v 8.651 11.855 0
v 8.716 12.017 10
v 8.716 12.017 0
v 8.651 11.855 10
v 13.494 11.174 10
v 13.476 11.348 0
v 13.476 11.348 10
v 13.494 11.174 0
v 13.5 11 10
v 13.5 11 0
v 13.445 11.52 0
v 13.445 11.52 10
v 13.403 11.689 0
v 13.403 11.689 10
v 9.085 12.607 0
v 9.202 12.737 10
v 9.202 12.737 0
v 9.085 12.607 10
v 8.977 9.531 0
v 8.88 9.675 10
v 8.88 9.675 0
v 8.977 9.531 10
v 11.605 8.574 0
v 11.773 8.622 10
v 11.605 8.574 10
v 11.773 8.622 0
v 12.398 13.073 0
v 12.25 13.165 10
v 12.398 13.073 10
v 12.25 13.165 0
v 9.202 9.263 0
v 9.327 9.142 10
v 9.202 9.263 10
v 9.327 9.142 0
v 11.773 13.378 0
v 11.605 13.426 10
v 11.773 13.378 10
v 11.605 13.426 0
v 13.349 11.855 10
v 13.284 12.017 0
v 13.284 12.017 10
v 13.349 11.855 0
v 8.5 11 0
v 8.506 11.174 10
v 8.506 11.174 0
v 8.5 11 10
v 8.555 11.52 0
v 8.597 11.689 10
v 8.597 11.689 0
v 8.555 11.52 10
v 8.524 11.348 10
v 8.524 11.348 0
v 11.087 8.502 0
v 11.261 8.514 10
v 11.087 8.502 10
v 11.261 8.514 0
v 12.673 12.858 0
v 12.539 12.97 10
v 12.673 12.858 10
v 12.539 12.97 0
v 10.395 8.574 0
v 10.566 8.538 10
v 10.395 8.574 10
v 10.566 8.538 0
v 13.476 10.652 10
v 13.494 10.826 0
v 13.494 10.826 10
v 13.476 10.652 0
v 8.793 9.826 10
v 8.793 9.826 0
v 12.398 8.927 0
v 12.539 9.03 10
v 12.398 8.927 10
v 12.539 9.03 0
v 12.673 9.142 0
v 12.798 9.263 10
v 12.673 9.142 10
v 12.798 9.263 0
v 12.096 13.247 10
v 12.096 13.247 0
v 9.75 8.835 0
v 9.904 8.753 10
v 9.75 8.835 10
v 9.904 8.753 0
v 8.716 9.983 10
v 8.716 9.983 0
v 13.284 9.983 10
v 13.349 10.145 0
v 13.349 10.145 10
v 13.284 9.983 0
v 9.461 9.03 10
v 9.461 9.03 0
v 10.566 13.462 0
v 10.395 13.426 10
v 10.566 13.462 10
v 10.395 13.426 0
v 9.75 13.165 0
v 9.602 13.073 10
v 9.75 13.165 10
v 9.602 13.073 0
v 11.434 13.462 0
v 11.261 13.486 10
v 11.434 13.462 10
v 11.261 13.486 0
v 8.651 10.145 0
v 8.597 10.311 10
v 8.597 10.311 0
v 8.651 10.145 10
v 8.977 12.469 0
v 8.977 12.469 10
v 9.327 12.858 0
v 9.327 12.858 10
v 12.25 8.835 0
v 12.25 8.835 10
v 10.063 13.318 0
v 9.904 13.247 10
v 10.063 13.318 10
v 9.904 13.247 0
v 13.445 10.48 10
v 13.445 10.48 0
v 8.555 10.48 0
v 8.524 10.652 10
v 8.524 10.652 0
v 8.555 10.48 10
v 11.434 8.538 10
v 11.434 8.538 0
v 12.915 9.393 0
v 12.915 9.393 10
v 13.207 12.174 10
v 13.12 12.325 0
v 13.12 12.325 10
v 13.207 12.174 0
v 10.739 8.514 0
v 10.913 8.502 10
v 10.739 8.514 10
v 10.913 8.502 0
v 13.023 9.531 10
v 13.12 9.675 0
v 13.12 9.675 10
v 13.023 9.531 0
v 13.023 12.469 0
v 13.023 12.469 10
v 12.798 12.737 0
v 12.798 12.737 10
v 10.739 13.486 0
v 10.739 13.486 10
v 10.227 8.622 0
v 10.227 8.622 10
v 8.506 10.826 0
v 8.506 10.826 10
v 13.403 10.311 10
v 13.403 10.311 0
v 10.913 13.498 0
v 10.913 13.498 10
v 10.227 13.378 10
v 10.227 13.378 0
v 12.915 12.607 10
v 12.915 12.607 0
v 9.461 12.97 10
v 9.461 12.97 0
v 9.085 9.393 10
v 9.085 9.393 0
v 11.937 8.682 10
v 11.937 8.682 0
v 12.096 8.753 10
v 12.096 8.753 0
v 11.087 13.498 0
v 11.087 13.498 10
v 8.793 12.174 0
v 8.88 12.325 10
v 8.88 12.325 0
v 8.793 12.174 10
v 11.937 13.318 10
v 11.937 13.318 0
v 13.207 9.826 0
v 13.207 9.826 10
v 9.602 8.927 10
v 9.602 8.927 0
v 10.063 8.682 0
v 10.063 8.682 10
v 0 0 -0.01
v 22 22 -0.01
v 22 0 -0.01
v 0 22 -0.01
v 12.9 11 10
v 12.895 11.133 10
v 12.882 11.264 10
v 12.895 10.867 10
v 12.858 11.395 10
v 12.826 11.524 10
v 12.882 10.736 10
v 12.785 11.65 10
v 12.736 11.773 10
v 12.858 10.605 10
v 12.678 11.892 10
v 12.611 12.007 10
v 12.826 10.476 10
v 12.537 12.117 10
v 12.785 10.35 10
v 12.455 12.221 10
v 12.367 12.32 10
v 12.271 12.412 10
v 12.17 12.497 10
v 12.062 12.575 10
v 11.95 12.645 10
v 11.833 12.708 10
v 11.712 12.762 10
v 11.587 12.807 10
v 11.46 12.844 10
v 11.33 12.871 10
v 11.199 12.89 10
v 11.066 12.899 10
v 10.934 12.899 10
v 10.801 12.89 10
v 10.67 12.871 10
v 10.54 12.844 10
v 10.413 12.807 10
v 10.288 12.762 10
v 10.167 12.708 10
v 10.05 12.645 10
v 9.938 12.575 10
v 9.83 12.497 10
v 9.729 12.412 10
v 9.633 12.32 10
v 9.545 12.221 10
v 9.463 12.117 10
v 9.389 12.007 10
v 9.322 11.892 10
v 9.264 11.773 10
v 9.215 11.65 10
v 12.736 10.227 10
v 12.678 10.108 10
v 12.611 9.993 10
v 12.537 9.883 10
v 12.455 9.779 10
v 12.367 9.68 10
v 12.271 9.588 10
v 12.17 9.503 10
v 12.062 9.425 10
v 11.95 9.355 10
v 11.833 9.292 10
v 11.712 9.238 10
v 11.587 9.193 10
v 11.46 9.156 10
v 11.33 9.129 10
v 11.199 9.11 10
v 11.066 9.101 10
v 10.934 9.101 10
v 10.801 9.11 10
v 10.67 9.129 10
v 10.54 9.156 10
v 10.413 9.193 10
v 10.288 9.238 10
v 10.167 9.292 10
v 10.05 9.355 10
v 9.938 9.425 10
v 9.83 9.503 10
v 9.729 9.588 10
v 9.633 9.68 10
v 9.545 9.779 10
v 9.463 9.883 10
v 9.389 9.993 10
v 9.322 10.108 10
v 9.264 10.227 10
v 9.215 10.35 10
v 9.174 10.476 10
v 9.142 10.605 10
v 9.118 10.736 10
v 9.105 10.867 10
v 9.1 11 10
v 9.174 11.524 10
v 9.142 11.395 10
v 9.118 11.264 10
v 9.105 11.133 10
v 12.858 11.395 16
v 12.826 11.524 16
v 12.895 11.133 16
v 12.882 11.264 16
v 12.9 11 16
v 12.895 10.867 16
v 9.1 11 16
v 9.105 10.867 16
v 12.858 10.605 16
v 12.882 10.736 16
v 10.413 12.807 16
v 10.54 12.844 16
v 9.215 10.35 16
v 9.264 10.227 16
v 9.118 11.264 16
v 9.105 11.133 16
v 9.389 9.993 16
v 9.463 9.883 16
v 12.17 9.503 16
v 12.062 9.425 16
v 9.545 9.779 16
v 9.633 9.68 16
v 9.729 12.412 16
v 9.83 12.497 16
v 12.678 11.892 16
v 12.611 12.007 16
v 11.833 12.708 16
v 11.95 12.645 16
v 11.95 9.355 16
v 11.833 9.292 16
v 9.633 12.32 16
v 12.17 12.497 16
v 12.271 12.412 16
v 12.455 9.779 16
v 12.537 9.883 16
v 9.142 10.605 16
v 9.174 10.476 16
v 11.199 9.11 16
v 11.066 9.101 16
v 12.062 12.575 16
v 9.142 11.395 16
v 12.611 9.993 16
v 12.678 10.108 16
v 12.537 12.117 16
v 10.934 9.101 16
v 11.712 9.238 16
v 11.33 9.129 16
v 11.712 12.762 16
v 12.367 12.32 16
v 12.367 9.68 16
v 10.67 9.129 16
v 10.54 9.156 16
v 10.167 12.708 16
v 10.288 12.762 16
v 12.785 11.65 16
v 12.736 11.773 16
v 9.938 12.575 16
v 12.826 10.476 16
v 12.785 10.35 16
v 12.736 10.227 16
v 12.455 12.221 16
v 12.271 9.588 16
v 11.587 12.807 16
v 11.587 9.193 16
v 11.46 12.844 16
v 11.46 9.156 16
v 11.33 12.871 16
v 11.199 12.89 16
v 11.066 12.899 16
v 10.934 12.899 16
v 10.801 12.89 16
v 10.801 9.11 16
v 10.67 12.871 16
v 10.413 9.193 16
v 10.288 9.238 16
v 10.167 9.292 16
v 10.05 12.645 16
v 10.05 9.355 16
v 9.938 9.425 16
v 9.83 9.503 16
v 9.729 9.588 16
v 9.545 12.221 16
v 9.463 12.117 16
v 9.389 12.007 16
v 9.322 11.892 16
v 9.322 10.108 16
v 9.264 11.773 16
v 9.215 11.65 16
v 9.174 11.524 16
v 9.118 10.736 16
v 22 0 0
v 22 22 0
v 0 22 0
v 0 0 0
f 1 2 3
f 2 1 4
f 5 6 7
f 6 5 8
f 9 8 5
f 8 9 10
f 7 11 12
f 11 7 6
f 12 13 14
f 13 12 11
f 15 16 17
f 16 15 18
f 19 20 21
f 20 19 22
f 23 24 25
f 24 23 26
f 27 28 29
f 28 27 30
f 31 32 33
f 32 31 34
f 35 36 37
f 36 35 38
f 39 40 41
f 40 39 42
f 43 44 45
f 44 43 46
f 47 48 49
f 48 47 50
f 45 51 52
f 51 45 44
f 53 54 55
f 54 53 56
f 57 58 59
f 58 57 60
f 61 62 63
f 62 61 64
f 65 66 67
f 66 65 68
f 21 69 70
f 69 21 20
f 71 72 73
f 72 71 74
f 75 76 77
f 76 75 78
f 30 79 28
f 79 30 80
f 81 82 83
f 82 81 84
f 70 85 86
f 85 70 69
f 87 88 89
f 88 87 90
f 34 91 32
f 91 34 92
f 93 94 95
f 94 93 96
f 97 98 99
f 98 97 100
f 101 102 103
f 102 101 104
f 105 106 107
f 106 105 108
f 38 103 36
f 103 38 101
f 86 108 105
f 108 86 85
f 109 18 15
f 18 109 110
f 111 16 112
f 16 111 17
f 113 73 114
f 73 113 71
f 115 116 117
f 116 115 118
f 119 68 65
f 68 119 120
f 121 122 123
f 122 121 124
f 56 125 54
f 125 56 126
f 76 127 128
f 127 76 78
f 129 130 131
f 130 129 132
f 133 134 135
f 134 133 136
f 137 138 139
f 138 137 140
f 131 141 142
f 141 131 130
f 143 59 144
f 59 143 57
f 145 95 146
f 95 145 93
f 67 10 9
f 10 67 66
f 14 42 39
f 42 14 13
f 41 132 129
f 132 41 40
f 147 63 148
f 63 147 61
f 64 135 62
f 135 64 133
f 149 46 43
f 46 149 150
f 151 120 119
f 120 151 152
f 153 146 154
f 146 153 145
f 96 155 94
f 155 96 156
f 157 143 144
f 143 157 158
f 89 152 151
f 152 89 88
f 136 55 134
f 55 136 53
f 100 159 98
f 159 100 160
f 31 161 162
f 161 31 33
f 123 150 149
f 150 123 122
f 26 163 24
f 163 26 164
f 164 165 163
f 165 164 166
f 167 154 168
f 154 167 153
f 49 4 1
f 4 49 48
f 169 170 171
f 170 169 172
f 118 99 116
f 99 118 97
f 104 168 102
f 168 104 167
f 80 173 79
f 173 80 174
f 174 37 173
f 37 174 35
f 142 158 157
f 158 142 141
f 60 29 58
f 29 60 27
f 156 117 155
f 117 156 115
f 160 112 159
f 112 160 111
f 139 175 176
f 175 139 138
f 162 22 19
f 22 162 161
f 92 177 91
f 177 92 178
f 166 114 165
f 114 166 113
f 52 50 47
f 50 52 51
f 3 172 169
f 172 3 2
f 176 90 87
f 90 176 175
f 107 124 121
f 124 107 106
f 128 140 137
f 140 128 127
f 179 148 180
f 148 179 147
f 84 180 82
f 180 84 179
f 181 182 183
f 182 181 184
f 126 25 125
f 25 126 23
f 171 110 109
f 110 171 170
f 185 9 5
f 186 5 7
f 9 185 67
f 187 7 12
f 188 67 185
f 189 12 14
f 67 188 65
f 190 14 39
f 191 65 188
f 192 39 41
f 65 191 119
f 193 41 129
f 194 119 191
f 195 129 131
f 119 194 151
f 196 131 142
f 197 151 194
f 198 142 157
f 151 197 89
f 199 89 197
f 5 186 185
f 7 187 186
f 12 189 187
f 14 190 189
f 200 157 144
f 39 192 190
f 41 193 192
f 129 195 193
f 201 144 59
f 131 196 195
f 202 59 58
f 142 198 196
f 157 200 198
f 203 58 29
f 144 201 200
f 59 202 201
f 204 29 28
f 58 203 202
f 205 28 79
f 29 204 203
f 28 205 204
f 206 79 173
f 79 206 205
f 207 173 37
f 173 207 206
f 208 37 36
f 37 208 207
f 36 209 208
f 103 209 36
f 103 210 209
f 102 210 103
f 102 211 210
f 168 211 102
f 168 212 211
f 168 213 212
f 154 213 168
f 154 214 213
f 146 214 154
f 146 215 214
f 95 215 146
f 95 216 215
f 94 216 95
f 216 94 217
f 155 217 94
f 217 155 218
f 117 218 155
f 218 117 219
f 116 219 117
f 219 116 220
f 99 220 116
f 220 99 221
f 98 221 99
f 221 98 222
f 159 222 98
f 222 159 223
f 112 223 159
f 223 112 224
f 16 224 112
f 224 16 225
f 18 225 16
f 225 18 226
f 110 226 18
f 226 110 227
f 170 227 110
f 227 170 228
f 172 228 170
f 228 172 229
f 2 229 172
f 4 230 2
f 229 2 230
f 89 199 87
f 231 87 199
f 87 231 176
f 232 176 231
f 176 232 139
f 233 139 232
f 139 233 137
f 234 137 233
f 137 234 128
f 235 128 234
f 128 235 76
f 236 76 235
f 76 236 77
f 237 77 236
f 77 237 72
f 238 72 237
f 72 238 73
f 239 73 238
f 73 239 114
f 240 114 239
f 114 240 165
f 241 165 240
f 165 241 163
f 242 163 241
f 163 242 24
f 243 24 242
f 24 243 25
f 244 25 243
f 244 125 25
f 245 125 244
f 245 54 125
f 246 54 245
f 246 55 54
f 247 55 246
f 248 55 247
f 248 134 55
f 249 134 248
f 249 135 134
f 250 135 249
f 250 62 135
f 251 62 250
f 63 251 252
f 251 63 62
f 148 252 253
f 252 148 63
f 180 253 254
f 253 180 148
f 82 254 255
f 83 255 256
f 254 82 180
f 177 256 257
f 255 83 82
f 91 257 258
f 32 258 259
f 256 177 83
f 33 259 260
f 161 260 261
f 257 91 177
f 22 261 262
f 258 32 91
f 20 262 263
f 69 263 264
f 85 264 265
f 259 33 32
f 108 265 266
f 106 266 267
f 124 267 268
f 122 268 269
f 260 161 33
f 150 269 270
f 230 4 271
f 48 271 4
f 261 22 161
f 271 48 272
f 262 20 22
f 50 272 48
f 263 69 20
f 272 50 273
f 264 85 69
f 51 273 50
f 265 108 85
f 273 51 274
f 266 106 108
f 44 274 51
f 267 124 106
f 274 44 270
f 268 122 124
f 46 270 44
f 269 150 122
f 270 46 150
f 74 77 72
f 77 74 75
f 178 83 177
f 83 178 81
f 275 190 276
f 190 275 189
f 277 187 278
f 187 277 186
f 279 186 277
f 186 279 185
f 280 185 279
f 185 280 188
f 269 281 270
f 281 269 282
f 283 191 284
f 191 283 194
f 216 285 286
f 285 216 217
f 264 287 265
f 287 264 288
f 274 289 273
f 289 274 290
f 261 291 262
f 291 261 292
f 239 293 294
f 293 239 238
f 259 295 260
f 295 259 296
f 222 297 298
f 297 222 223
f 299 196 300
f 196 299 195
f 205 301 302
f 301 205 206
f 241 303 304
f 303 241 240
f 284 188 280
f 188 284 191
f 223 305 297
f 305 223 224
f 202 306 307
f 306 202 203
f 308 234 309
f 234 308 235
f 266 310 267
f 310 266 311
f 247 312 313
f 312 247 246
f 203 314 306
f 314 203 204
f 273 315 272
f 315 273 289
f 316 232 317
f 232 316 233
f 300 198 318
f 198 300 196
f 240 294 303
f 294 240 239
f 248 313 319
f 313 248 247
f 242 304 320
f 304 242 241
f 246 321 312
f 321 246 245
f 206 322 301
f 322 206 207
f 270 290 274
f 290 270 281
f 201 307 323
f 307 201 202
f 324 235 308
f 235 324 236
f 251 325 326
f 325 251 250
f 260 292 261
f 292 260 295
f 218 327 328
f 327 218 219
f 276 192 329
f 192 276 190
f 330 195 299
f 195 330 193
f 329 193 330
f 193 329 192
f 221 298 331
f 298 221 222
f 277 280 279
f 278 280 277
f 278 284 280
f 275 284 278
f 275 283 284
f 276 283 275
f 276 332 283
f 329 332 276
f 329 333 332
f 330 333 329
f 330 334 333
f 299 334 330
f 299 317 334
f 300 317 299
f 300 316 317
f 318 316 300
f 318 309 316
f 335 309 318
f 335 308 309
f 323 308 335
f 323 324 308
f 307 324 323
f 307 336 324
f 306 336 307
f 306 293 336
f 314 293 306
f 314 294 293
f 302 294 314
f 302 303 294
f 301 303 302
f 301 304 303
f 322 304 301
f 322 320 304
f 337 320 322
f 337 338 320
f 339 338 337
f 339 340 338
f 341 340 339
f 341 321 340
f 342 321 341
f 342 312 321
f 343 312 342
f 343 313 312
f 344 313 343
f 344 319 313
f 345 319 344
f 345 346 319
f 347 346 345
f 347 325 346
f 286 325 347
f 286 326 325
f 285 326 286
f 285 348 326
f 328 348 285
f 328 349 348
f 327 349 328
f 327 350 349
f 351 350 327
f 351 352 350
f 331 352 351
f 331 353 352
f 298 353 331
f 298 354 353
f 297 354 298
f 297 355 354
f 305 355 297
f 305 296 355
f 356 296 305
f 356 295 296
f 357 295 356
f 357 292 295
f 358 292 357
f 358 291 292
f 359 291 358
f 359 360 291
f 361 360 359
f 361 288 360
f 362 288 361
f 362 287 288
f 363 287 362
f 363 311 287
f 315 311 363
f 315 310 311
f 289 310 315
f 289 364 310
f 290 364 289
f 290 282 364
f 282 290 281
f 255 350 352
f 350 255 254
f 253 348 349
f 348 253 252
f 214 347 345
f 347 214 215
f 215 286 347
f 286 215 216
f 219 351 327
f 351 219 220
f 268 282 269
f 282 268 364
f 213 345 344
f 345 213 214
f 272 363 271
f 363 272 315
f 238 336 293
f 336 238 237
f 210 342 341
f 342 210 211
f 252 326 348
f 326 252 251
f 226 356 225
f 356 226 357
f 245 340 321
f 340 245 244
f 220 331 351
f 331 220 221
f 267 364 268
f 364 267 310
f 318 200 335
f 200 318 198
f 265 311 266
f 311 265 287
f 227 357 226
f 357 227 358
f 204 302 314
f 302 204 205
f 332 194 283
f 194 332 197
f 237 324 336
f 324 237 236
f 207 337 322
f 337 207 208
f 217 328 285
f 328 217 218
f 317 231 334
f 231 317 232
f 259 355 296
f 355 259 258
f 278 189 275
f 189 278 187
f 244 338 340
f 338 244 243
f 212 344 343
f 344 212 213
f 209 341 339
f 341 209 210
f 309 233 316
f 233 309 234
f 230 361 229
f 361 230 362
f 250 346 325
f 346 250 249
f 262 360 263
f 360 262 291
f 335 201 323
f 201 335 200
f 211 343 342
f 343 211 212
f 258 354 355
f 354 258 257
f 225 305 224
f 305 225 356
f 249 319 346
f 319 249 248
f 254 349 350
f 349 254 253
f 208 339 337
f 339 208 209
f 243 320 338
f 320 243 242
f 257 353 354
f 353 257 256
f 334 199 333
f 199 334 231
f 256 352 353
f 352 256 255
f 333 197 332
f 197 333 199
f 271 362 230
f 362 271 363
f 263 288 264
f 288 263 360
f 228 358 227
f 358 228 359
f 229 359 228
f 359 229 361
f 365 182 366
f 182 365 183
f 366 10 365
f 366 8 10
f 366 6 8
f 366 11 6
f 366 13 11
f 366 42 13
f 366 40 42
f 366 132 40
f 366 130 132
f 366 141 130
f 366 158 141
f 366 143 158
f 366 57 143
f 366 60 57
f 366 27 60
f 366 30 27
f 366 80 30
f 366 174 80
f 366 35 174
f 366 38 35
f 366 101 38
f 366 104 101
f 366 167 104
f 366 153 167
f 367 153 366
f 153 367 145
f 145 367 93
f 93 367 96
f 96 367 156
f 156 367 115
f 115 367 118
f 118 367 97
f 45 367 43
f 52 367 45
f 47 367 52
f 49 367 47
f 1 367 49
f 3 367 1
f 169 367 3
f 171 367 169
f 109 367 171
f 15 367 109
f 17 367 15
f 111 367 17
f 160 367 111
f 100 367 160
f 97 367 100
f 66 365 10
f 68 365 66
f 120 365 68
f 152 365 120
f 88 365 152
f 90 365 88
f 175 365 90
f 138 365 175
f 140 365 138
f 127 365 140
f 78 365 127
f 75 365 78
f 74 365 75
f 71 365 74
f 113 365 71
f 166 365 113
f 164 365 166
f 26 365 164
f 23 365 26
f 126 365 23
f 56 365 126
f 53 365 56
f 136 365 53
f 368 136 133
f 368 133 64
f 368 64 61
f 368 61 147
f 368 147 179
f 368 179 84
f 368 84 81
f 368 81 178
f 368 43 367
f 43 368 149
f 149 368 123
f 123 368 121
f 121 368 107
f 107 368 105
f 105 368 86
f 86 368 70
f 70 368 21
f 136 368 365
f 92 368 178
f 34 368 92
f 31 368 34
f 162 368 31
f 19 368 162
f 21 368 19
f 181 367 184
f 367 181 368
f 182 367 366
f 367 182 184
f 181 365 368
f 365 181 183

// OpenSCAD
// file: ../Base/Rotation.scad
// Fischertechnik Box Foundation
// Geometry Helpers Rotation

include <PlacementOptions.scad>

// getRotatedSpace(space, rotation=NoRotation)
// Rotates the space dependent on the specified rotation

function getRotatedSpace(space, rotation=NoRotation) = [
    (rotation == Rotate90 || rotation == Rotate270) ? space.y : space.x,
    (rotation == Rotate90 || rotation == Rotate270) ? space.x : space.y
];

// Rotates the given space around the fixed left lower corner
// space = the space the children needs as width/depth list [width,depth]
// rotation = 0 Rotate0 degrees, 1 Rotate90 degrees, 2 Rotate180 degrees, 3 Rotate270 degrees (equivalent to -90)

module RotateFix(space, rotation=NoRotation) {
    dy = (rotation == Rotate0 || rotation == Rotate270) ? 0 :
        (rotation == Rotate90) ? space.x :
        space.y;
    dx = (rotation < Rotate180) ? 0 :
        (rotation == Rotate180) ? space.x :
        space.y;
    
    translate([dx, dy, 0])
        rotate([0, 0, rotations[rotation]])
            children();
}
// file: ../Base/Alignment.scad
// Fischertechnik Box Foundation
// Geometry Helpers Alignment

include <PlacementOptions.scad>

// getAlignedX(elementWidth, spaceWidth, align=AlignRight, offset=0)
// Gets the aligned X offset of an element with the given
// width in the given space.
// elementWidth = The width of the element to positon
// spaceWidth = The space where the element should be aligned
// align = 0 AlignLeft, 1 AlignCenter, 2 AlignRight
// offset = an optional offset from the aligned position. When
// aligned left or centered, then positive values are in X direction.
// When aligned right then positive values are in negative X direction.

function getAlignedX(elementWidth, spaceWidth, align=AlignRight, offset=0) =
    (align == AlignLeft) ?
        offset :
        ((align == AlignCenter) ?
        (spaceWidth - elementWidth)/2 + offset :
        spaceWidth - offset - elementWidth);

// getAlignedY(elementDepth, spaceDepth, align=AlignTop, offset=0)
// Gets the aligned Y offset of an element with the given
// depth in the given space.
// elementDepth = The depth of the element to positon
// spaceDepth = The space where the element should be aligned
// align = 0 AlignBottom, 1 AlignCenter, 2 AlignTop
// offset = an optional offset from the aligned position. When
// aligned bottom or centered, then positive values are in Y direction.
// When aligned top then positive values are in negative Y direction.

function getAlignedY(elementDepth, spaceDepth, align=AlignTop, offset=0) =
    (align == AlignBottom) ?
        offset :
        ((align == AlignCenter) ?
        (spaceDepth - elementDepth)/2 + offset :
        spaceDepth - offset - elementDepth);
// file: ../Base/PlacementOptions.scad
// Fischertechnik Box Foundation
// Placement Options

// Alignment
NoAlign = 0;
AlignLeft = 1;
AlignBottom = 2;
AlignCenter = 3;
AlignRight = 4;
AlignTop = 5;

// Element rotation degree steps
rotations = [0, -90, -180, -270];

// Rotation
NoRotation = 0;
Rotate0 = 0;
Rotate90 = 1;
Rotate180 = 2;
Rotate270 = 3;

// Docking (seen from above)
NoDock = -1;
DockLeft = 0;
DockTop = 1;
DockRight = 2;
DockCorner = 2;
DockBottom = 3;

// Web corners
LowerLeft = 0;
UpperLeft = 1;
UpperRight = 2;
LowerRight = 3;

// Web position relative to corner
LeftOfCorner = 0;
RightOfCorner = 1;
// file: ../Base/Boxes.scad
// Fischertechnik Box Foundation
// Pre-designed Boxes

use <Constants.scad>

include <PlacementOptions.scad>

box190Width = 190;
box190Depth = 130;
box130Width = 130;
box130Depth = 95;

// Values are from an original ec3 box
topBottomDifference = 1.5;
outerHeight = 40;
innerHeight = 38.2;
baseThickness = outerHeight - innerHeight;
stackExcess = 5.7;
radius = 3.5;
wallThickness = 1.5;
tolerance = 0.2;
stackOffset = innerHeight - stackExcess;

boxUsageHeight = stackOffset;
boxWallThickness = wallThickness;
boxBaseThickness = baseThickness;
boxWebWidth = 3.0;

// getBoxWallThickness()
// Gets the wall thickness of a Fischertechnik Box
function getBoxWallThickness() = boxWallThickness;

// getBoxUsageHeight()
// Gets the usable height of a Fischertechnik box
function getBoxUsageHeight() = boxUsageHeight;

// getBoxInnerHeight()
// Gets the inner height of a Fischertechnik box, including the stack excess
function getBoxInnerHeight() = innerHeight;

// getBoxBaseThickness()
// Gets the thickness of the Fischertechnik box base.
function getBoxBaseThickness() = boxBaseThickness;

// getBoxWebWidth()
// Gets the width of a box web
function getBoxWebWidth() = boxWebWidth;

// getBox190Space()
// Gets the usable inner space of a Box 190 as an x/y-list
function getBox190Space() = [
    box190Width - 2*getBoxWallThickness() - topBottomDifference, 
    box190Depth - 2*getBoxWallThickness() - topBottomDifference ];

// BoxBase(width, depth)
// Creates an empty stackable Fischertechnik compatible box
// width = Outer width of the box (190, 130, ...)
// depth = Outer depth of the box (130, 95, ...)

module BoxBase(width, depth, height=outerHeight) {    
    thinPlate = 0.01;

    innerHeight = height - baseThickness;    
    
    module BodyPlate(width, depth) {
        translate([radius, radius])
        hull() {
            w = width-2*radius;
            d = depth-2*radius;
            cube([w, d, thinPlate]);
            cylinder(thinPlate, r=radius, $fn=getFragments());
            translate([w, 0])
                cylinder(thinPlate, r=radius, $fn=getFragments());
            translate([w, d])
                cylinder(thinPlate, r=radius, $fn=getFragments());
            translate([0, d])
                cylinder(thinPlate, r=radius, $fn=getFragments());
        }
    }
    
    module Body(tolerance=tolerance) {
        hull() {
            // Bottom with tolerance to fit into the original boxes when stacked
            translate([-wallThickness+tolerance, -wallThickness+tolerance, -baseThickness])
                BodyPlate(width-topBottomDifference-2*tolerance, depth-topBottomDifference-2*tolerance);
            
            // Top
            translate([-wallThickness-topBottomDifference/2, -wallThickness-topBottomDifference/2, innerHeight-thinPlate])
                BodyPlate(width, depth);
         }
    }

    module Cutoff() {
        hull() {
            coWidth = width - 2*wallThickness;
            coDepth = depth - 2*wallThickness;
            
            // Bottom
            BodyPlate(coWidth-topBottomDifference, coDepth-topBottomDifference);

            // Top
            translate([-topBottomDifference/2, -topBottomDifference/2, innerHeight+thinPlate]) 
                BodyPlate(coWidth, coDepth);
        }
    }
    
    difference() {        
        Body();
        Cutoff();
        stackOffset = innerHeight - stackExcess;
        translate([0, 0, stackOffset + baseThickness])
            Body(tolerance=0);
    }
}

// Creates the Fischertechnik empty box 130x190 mm and places it at position 0,0
// 190x130 are the outer sizes, the inner space is slightly smaller. Use getBox190Space() to get the inner sizes.
// The box is positioned that the usable inner space is at the 0,0,0 position. The

module Box190() {
    BoxBase(box190Width, box190Depth);
}

// Gets the usable inner space of a Box 130 as an x/y-list
function getBox130Space() = [
    box130Width - 2*getBoxWallThickness() - topBottomDifference, 
    box130Depth - 2*getBoxWallThickness() - topBottomDifference ];

// Creates the Fischertechnik empty box 95x130 mm and places it at position 0,0
// 190x130 are the outer sizes, the inner space is slightly smaller. Use getBox190Space() to get the inner sizes.
// The box is positioned that the usable inner space is at the 0,0,0 position. The

module Box130() {
    BoxBase(box130Width, box130Depth);
}

// Creates a web at the specified box walls
// corner 0 = LowerLeft, 1 = UpperLeft, 2 = UpperRight, 3 = LowerRight
// side 0 = LeftOfCorner, 1 = RightOfCorner
// distance = Distance in mm from the corner
// boxSpace = inner width and depth of the box (default: Box 190)
// webWidth = length of the web (default is 3 mms)
// webThickness = thickness of the web (default is 1 mm)

module BoxWeb(corner, side, distance, boxSpace=getBox190Space(), webWidth=getBoxWebWidth(), webThickness=1.0) {
    sink = getBoxWallThickness()/2;

    width = (corner % 2 == 0) ? 
            (side == LeftOfCorner ? webWidth : webThickness) :
            (side == LeftOfCorner ? webThickness : webWidth);

    depth = (corner % 2 == 0) ? 
            (side == RightOfCorner ? webWidth : webThickness) :
            (side == RightOfCorner ? webThickness : webWidth);
    
    xDiff = corner == LowerLeft ? 
                (side == LeftOfCorner ? -sink : distance) :
            (corner == UpperLeft ?                
                (side == LeftOfCorner ? distance : -sink) :
            (corner == UpperRight ?
                (side == LeftOfCorner ? boxSpace.x-webWidth+sink : boxSpace.x-distance-webThickness) :
                (side == LeftOfCorner ? boxSpace.x-distance-webThickness: boxSpace.x-webWidth+sink)));

    yDiff = corner == LowerLeft ? 
                (side == RightOfCorner ? -sink : distance) :
            (corner == UpperLeft ?
                (side == RightOfCorner ? boxSpace.y-distance : boxSpace.y-webWidth+sink) :
            (corner == UpperRight ?
                (side == RightOfCorner ? boxSpace.y-webWidth+sink : boxSpace.y-distance) :
                (side == RightOfCorner ? distance : -sink)));
    
    translate([xDiff, yDiff, -getExcess()])
        cube([width, depth, boxUsageHeight + 2*getExcess()]);
}
// file: ../Base/Placement.scad
// Fischertechnik Box Foundation
// Geometry Helpers Placement

use <Constants.scad>
use <Alignment.scad>
use <Rotation.scad>
use <Boxes.scad>

include <PlacementOptions.scad>

// Place(x=0, y=0, elementSpace=[0,0], alignX=AlignLeft, alignY=AlignBottom, rotation=Rotate0, boxSpace=getBox190Space())
// Places the child at the specified position
// y = Y-Position. This is a relative position when an X aligment is specified.
// x = X-Position. This is a relative position when an Y aligment is specified.
// elementSpace = space of the element to be placed [x,y]
// alignX = -1=NoAlign, 0 AlignLeft, 1 AlignCenter, 3 AlignRight (elementSpace and boxSpace required!)
// alignY = -1=NoAlign, 2 AlignBottom, 1 AlignCenter, 4 AlignTop (elementSpace and boxSpace required!)
// rotation = 0 Rotate0 0 degrees, 1 Rotate90 90 degrees, 
// 2 Rotate180 180 degrees, 3 Rotate270 270 degrees (equivalent to -90)
// boxSpace = Inner space of the box where the placement occurs [x,y] - default is Box 190x130 inner space

module Place(x=0, y=0, elementSpace=[0,0], 
  alignX=AlignLeft, alignY=AlignBottom, 
  rotation=NoRotation, boxSpace=getBox190Space()) {

    module Position(x, y, space, rotation=Rotate0) {
        translate([x, y, 0])
            RotateFix(space, rotation)
                children();
    }

    space = getRotatedSpace(elementSpace, rotation);
    alignedX = getAlignedX(space.x, boxSpace.x, alignX, x);
    alignedY = getAlignedY(space.y, boxSpace.y, alignY, y);
    Position(alignedX, alignedY, elementSpace, rotation)
        children();
}

// Center(space=getBox130Space(), elementSpace=[0,0])
// space = Space where the children is centered. For cylinder use centered=true and no elementSpace.
// elementSpace = space of the element to be centered [x,y]

module Center(space=getBox190Space(), elementSpace=[0,0]) {
    Place(elementSpace=elementSpace, boxSpace=space, alignX=AlignCenter, alignY=AlignCenter)
        children();
}

// CenterHorizontal(width=0, y=0, offset=0, space=getBox130Space())
// width = Width of the element to be placed.
// y = Y position of the element
// offset = Offset from the center position (negative will be left of the center)
// space = Space where the element is placed

module CenterHorizontal(width=0, y=0, offset=0, space=getBox190Space()) {
    Place(x=offset, y=y, elementSpace=[width, 0], boxSpace=space, alignX=AlignCenter)
        children(0);
}

// CenterVertical(depth=0, x=0, offset=0, space=getBox130Space())
// depth = Depth of the element to be placed.
// x = X position of the element
// offset = Offset from the center position (negative will be down of the center)
// space = Space where the element is placed

module CenterVertical(depth=0, x=0, offset=0, space=getBox190Space()) {
    Place(x=x, y=offset, elementSpace=[0, depth], boxSpace=space, alignY=AlignCenter)
        children(0);
}

// getIsVertical(align)
// True if the specified alignment needs a vertical orientation for a divider (AlignRight, AlignLeft)

function getIsVertical(align) = (align == AlignRight || align == AlignLeft);

// getIsHorizontal(align)
// True if the specified alignment needs a horizontal orientation for a divider (AlignTop, AlignBottom)

function getIsHorizontal(align) = (align == AlignTop || align == AlignBottom);
// file: ../Base/Constants.scad
// Fischertechnik Box Foundation
// Constants

// Constant values necessary for multiple elements

// Base constants
dividerThickness = 1.2;
excess = 0.01;
fragments = 90;
tolerance = 0.8;

// Gets the thickness of a divider 
function getDividerThickness() = dividerThickness;

// Gets the excess that is used to merge walls into each other
function getExcess() = excess;

// Gets amount of fragments of a cylinder
function getFragments() = fragments;

// Gets the inner tolerance of a frame to each side
function getTolerance() = tolerance;


// Fischertechnik specific constants
axisDiameter = 4;
axisBottomDiameter = axisDiameter + 1;
axisTolerance = 0.2;
standardEdgeDistance = 2.5;
standardWebDistance = 11.5;
standardCornerLength = 15;
tubeWallFactor = 0.8;
smallPartsFrameHeight = 20;

// Gets axis diameter of Fischertechnik axis
function getAxisDiameter() = axisDiameter;

// Gets axis diameter tolerance (subtracted for element axis)
function getAxisTolerance() = axisTolerance;

// Gets the axis diameter for standing axis
function getStandAxisDiameter() = getAxisDiameter() - getAxisTolerance();

// Gets axis bottom diameter for thicker part at the bottom
function getAxisBottomDiameter() = axisBottomDiameter;

// gets the standard distance to the wall of the box for dockable frames with webs
function getStandardEdgeDistance() = standardEdgeDistance;

// gets the standard distance of each web to the corner of the dockable frame
function getStandardWebDistance() = standardWebDistance;

// gets the standard length of the corner walls of a dockable frame
function getStandardCornerLength() = standardCornerLength;

// gets the wall thickness of a tube.
function getTubeWallThickness() = tubeWallFactor * getDividerThickness();

// gets the frame height for docked small parts boxes.
function getSmallPartsFrameHeight() = smallPartsFrameHeight;
// main file
// Fischertechnik Box Library
// Axis for Wheel Pulley
// 35795

use <../Base/Constants.scad>
use <../ModelBase/Simple.scad>

width = 22;
depth = 22;

// getAxisPulleySpace()
// Gets the space the axis wheel pulley needs as width and depth (.x and .y as a list)

function getAxisPulleySpace() = [width, depth];

// AxisPulley()
// Standing axis for wheel pulley.

module AxisPulley() {
    height = 16;
    levelHeight = 10;
    LeveledAxisWithSpace(height, levelHeight, getAxisPulleySpace());
}

// Tests
color("lightgray")
AxisPulley();
